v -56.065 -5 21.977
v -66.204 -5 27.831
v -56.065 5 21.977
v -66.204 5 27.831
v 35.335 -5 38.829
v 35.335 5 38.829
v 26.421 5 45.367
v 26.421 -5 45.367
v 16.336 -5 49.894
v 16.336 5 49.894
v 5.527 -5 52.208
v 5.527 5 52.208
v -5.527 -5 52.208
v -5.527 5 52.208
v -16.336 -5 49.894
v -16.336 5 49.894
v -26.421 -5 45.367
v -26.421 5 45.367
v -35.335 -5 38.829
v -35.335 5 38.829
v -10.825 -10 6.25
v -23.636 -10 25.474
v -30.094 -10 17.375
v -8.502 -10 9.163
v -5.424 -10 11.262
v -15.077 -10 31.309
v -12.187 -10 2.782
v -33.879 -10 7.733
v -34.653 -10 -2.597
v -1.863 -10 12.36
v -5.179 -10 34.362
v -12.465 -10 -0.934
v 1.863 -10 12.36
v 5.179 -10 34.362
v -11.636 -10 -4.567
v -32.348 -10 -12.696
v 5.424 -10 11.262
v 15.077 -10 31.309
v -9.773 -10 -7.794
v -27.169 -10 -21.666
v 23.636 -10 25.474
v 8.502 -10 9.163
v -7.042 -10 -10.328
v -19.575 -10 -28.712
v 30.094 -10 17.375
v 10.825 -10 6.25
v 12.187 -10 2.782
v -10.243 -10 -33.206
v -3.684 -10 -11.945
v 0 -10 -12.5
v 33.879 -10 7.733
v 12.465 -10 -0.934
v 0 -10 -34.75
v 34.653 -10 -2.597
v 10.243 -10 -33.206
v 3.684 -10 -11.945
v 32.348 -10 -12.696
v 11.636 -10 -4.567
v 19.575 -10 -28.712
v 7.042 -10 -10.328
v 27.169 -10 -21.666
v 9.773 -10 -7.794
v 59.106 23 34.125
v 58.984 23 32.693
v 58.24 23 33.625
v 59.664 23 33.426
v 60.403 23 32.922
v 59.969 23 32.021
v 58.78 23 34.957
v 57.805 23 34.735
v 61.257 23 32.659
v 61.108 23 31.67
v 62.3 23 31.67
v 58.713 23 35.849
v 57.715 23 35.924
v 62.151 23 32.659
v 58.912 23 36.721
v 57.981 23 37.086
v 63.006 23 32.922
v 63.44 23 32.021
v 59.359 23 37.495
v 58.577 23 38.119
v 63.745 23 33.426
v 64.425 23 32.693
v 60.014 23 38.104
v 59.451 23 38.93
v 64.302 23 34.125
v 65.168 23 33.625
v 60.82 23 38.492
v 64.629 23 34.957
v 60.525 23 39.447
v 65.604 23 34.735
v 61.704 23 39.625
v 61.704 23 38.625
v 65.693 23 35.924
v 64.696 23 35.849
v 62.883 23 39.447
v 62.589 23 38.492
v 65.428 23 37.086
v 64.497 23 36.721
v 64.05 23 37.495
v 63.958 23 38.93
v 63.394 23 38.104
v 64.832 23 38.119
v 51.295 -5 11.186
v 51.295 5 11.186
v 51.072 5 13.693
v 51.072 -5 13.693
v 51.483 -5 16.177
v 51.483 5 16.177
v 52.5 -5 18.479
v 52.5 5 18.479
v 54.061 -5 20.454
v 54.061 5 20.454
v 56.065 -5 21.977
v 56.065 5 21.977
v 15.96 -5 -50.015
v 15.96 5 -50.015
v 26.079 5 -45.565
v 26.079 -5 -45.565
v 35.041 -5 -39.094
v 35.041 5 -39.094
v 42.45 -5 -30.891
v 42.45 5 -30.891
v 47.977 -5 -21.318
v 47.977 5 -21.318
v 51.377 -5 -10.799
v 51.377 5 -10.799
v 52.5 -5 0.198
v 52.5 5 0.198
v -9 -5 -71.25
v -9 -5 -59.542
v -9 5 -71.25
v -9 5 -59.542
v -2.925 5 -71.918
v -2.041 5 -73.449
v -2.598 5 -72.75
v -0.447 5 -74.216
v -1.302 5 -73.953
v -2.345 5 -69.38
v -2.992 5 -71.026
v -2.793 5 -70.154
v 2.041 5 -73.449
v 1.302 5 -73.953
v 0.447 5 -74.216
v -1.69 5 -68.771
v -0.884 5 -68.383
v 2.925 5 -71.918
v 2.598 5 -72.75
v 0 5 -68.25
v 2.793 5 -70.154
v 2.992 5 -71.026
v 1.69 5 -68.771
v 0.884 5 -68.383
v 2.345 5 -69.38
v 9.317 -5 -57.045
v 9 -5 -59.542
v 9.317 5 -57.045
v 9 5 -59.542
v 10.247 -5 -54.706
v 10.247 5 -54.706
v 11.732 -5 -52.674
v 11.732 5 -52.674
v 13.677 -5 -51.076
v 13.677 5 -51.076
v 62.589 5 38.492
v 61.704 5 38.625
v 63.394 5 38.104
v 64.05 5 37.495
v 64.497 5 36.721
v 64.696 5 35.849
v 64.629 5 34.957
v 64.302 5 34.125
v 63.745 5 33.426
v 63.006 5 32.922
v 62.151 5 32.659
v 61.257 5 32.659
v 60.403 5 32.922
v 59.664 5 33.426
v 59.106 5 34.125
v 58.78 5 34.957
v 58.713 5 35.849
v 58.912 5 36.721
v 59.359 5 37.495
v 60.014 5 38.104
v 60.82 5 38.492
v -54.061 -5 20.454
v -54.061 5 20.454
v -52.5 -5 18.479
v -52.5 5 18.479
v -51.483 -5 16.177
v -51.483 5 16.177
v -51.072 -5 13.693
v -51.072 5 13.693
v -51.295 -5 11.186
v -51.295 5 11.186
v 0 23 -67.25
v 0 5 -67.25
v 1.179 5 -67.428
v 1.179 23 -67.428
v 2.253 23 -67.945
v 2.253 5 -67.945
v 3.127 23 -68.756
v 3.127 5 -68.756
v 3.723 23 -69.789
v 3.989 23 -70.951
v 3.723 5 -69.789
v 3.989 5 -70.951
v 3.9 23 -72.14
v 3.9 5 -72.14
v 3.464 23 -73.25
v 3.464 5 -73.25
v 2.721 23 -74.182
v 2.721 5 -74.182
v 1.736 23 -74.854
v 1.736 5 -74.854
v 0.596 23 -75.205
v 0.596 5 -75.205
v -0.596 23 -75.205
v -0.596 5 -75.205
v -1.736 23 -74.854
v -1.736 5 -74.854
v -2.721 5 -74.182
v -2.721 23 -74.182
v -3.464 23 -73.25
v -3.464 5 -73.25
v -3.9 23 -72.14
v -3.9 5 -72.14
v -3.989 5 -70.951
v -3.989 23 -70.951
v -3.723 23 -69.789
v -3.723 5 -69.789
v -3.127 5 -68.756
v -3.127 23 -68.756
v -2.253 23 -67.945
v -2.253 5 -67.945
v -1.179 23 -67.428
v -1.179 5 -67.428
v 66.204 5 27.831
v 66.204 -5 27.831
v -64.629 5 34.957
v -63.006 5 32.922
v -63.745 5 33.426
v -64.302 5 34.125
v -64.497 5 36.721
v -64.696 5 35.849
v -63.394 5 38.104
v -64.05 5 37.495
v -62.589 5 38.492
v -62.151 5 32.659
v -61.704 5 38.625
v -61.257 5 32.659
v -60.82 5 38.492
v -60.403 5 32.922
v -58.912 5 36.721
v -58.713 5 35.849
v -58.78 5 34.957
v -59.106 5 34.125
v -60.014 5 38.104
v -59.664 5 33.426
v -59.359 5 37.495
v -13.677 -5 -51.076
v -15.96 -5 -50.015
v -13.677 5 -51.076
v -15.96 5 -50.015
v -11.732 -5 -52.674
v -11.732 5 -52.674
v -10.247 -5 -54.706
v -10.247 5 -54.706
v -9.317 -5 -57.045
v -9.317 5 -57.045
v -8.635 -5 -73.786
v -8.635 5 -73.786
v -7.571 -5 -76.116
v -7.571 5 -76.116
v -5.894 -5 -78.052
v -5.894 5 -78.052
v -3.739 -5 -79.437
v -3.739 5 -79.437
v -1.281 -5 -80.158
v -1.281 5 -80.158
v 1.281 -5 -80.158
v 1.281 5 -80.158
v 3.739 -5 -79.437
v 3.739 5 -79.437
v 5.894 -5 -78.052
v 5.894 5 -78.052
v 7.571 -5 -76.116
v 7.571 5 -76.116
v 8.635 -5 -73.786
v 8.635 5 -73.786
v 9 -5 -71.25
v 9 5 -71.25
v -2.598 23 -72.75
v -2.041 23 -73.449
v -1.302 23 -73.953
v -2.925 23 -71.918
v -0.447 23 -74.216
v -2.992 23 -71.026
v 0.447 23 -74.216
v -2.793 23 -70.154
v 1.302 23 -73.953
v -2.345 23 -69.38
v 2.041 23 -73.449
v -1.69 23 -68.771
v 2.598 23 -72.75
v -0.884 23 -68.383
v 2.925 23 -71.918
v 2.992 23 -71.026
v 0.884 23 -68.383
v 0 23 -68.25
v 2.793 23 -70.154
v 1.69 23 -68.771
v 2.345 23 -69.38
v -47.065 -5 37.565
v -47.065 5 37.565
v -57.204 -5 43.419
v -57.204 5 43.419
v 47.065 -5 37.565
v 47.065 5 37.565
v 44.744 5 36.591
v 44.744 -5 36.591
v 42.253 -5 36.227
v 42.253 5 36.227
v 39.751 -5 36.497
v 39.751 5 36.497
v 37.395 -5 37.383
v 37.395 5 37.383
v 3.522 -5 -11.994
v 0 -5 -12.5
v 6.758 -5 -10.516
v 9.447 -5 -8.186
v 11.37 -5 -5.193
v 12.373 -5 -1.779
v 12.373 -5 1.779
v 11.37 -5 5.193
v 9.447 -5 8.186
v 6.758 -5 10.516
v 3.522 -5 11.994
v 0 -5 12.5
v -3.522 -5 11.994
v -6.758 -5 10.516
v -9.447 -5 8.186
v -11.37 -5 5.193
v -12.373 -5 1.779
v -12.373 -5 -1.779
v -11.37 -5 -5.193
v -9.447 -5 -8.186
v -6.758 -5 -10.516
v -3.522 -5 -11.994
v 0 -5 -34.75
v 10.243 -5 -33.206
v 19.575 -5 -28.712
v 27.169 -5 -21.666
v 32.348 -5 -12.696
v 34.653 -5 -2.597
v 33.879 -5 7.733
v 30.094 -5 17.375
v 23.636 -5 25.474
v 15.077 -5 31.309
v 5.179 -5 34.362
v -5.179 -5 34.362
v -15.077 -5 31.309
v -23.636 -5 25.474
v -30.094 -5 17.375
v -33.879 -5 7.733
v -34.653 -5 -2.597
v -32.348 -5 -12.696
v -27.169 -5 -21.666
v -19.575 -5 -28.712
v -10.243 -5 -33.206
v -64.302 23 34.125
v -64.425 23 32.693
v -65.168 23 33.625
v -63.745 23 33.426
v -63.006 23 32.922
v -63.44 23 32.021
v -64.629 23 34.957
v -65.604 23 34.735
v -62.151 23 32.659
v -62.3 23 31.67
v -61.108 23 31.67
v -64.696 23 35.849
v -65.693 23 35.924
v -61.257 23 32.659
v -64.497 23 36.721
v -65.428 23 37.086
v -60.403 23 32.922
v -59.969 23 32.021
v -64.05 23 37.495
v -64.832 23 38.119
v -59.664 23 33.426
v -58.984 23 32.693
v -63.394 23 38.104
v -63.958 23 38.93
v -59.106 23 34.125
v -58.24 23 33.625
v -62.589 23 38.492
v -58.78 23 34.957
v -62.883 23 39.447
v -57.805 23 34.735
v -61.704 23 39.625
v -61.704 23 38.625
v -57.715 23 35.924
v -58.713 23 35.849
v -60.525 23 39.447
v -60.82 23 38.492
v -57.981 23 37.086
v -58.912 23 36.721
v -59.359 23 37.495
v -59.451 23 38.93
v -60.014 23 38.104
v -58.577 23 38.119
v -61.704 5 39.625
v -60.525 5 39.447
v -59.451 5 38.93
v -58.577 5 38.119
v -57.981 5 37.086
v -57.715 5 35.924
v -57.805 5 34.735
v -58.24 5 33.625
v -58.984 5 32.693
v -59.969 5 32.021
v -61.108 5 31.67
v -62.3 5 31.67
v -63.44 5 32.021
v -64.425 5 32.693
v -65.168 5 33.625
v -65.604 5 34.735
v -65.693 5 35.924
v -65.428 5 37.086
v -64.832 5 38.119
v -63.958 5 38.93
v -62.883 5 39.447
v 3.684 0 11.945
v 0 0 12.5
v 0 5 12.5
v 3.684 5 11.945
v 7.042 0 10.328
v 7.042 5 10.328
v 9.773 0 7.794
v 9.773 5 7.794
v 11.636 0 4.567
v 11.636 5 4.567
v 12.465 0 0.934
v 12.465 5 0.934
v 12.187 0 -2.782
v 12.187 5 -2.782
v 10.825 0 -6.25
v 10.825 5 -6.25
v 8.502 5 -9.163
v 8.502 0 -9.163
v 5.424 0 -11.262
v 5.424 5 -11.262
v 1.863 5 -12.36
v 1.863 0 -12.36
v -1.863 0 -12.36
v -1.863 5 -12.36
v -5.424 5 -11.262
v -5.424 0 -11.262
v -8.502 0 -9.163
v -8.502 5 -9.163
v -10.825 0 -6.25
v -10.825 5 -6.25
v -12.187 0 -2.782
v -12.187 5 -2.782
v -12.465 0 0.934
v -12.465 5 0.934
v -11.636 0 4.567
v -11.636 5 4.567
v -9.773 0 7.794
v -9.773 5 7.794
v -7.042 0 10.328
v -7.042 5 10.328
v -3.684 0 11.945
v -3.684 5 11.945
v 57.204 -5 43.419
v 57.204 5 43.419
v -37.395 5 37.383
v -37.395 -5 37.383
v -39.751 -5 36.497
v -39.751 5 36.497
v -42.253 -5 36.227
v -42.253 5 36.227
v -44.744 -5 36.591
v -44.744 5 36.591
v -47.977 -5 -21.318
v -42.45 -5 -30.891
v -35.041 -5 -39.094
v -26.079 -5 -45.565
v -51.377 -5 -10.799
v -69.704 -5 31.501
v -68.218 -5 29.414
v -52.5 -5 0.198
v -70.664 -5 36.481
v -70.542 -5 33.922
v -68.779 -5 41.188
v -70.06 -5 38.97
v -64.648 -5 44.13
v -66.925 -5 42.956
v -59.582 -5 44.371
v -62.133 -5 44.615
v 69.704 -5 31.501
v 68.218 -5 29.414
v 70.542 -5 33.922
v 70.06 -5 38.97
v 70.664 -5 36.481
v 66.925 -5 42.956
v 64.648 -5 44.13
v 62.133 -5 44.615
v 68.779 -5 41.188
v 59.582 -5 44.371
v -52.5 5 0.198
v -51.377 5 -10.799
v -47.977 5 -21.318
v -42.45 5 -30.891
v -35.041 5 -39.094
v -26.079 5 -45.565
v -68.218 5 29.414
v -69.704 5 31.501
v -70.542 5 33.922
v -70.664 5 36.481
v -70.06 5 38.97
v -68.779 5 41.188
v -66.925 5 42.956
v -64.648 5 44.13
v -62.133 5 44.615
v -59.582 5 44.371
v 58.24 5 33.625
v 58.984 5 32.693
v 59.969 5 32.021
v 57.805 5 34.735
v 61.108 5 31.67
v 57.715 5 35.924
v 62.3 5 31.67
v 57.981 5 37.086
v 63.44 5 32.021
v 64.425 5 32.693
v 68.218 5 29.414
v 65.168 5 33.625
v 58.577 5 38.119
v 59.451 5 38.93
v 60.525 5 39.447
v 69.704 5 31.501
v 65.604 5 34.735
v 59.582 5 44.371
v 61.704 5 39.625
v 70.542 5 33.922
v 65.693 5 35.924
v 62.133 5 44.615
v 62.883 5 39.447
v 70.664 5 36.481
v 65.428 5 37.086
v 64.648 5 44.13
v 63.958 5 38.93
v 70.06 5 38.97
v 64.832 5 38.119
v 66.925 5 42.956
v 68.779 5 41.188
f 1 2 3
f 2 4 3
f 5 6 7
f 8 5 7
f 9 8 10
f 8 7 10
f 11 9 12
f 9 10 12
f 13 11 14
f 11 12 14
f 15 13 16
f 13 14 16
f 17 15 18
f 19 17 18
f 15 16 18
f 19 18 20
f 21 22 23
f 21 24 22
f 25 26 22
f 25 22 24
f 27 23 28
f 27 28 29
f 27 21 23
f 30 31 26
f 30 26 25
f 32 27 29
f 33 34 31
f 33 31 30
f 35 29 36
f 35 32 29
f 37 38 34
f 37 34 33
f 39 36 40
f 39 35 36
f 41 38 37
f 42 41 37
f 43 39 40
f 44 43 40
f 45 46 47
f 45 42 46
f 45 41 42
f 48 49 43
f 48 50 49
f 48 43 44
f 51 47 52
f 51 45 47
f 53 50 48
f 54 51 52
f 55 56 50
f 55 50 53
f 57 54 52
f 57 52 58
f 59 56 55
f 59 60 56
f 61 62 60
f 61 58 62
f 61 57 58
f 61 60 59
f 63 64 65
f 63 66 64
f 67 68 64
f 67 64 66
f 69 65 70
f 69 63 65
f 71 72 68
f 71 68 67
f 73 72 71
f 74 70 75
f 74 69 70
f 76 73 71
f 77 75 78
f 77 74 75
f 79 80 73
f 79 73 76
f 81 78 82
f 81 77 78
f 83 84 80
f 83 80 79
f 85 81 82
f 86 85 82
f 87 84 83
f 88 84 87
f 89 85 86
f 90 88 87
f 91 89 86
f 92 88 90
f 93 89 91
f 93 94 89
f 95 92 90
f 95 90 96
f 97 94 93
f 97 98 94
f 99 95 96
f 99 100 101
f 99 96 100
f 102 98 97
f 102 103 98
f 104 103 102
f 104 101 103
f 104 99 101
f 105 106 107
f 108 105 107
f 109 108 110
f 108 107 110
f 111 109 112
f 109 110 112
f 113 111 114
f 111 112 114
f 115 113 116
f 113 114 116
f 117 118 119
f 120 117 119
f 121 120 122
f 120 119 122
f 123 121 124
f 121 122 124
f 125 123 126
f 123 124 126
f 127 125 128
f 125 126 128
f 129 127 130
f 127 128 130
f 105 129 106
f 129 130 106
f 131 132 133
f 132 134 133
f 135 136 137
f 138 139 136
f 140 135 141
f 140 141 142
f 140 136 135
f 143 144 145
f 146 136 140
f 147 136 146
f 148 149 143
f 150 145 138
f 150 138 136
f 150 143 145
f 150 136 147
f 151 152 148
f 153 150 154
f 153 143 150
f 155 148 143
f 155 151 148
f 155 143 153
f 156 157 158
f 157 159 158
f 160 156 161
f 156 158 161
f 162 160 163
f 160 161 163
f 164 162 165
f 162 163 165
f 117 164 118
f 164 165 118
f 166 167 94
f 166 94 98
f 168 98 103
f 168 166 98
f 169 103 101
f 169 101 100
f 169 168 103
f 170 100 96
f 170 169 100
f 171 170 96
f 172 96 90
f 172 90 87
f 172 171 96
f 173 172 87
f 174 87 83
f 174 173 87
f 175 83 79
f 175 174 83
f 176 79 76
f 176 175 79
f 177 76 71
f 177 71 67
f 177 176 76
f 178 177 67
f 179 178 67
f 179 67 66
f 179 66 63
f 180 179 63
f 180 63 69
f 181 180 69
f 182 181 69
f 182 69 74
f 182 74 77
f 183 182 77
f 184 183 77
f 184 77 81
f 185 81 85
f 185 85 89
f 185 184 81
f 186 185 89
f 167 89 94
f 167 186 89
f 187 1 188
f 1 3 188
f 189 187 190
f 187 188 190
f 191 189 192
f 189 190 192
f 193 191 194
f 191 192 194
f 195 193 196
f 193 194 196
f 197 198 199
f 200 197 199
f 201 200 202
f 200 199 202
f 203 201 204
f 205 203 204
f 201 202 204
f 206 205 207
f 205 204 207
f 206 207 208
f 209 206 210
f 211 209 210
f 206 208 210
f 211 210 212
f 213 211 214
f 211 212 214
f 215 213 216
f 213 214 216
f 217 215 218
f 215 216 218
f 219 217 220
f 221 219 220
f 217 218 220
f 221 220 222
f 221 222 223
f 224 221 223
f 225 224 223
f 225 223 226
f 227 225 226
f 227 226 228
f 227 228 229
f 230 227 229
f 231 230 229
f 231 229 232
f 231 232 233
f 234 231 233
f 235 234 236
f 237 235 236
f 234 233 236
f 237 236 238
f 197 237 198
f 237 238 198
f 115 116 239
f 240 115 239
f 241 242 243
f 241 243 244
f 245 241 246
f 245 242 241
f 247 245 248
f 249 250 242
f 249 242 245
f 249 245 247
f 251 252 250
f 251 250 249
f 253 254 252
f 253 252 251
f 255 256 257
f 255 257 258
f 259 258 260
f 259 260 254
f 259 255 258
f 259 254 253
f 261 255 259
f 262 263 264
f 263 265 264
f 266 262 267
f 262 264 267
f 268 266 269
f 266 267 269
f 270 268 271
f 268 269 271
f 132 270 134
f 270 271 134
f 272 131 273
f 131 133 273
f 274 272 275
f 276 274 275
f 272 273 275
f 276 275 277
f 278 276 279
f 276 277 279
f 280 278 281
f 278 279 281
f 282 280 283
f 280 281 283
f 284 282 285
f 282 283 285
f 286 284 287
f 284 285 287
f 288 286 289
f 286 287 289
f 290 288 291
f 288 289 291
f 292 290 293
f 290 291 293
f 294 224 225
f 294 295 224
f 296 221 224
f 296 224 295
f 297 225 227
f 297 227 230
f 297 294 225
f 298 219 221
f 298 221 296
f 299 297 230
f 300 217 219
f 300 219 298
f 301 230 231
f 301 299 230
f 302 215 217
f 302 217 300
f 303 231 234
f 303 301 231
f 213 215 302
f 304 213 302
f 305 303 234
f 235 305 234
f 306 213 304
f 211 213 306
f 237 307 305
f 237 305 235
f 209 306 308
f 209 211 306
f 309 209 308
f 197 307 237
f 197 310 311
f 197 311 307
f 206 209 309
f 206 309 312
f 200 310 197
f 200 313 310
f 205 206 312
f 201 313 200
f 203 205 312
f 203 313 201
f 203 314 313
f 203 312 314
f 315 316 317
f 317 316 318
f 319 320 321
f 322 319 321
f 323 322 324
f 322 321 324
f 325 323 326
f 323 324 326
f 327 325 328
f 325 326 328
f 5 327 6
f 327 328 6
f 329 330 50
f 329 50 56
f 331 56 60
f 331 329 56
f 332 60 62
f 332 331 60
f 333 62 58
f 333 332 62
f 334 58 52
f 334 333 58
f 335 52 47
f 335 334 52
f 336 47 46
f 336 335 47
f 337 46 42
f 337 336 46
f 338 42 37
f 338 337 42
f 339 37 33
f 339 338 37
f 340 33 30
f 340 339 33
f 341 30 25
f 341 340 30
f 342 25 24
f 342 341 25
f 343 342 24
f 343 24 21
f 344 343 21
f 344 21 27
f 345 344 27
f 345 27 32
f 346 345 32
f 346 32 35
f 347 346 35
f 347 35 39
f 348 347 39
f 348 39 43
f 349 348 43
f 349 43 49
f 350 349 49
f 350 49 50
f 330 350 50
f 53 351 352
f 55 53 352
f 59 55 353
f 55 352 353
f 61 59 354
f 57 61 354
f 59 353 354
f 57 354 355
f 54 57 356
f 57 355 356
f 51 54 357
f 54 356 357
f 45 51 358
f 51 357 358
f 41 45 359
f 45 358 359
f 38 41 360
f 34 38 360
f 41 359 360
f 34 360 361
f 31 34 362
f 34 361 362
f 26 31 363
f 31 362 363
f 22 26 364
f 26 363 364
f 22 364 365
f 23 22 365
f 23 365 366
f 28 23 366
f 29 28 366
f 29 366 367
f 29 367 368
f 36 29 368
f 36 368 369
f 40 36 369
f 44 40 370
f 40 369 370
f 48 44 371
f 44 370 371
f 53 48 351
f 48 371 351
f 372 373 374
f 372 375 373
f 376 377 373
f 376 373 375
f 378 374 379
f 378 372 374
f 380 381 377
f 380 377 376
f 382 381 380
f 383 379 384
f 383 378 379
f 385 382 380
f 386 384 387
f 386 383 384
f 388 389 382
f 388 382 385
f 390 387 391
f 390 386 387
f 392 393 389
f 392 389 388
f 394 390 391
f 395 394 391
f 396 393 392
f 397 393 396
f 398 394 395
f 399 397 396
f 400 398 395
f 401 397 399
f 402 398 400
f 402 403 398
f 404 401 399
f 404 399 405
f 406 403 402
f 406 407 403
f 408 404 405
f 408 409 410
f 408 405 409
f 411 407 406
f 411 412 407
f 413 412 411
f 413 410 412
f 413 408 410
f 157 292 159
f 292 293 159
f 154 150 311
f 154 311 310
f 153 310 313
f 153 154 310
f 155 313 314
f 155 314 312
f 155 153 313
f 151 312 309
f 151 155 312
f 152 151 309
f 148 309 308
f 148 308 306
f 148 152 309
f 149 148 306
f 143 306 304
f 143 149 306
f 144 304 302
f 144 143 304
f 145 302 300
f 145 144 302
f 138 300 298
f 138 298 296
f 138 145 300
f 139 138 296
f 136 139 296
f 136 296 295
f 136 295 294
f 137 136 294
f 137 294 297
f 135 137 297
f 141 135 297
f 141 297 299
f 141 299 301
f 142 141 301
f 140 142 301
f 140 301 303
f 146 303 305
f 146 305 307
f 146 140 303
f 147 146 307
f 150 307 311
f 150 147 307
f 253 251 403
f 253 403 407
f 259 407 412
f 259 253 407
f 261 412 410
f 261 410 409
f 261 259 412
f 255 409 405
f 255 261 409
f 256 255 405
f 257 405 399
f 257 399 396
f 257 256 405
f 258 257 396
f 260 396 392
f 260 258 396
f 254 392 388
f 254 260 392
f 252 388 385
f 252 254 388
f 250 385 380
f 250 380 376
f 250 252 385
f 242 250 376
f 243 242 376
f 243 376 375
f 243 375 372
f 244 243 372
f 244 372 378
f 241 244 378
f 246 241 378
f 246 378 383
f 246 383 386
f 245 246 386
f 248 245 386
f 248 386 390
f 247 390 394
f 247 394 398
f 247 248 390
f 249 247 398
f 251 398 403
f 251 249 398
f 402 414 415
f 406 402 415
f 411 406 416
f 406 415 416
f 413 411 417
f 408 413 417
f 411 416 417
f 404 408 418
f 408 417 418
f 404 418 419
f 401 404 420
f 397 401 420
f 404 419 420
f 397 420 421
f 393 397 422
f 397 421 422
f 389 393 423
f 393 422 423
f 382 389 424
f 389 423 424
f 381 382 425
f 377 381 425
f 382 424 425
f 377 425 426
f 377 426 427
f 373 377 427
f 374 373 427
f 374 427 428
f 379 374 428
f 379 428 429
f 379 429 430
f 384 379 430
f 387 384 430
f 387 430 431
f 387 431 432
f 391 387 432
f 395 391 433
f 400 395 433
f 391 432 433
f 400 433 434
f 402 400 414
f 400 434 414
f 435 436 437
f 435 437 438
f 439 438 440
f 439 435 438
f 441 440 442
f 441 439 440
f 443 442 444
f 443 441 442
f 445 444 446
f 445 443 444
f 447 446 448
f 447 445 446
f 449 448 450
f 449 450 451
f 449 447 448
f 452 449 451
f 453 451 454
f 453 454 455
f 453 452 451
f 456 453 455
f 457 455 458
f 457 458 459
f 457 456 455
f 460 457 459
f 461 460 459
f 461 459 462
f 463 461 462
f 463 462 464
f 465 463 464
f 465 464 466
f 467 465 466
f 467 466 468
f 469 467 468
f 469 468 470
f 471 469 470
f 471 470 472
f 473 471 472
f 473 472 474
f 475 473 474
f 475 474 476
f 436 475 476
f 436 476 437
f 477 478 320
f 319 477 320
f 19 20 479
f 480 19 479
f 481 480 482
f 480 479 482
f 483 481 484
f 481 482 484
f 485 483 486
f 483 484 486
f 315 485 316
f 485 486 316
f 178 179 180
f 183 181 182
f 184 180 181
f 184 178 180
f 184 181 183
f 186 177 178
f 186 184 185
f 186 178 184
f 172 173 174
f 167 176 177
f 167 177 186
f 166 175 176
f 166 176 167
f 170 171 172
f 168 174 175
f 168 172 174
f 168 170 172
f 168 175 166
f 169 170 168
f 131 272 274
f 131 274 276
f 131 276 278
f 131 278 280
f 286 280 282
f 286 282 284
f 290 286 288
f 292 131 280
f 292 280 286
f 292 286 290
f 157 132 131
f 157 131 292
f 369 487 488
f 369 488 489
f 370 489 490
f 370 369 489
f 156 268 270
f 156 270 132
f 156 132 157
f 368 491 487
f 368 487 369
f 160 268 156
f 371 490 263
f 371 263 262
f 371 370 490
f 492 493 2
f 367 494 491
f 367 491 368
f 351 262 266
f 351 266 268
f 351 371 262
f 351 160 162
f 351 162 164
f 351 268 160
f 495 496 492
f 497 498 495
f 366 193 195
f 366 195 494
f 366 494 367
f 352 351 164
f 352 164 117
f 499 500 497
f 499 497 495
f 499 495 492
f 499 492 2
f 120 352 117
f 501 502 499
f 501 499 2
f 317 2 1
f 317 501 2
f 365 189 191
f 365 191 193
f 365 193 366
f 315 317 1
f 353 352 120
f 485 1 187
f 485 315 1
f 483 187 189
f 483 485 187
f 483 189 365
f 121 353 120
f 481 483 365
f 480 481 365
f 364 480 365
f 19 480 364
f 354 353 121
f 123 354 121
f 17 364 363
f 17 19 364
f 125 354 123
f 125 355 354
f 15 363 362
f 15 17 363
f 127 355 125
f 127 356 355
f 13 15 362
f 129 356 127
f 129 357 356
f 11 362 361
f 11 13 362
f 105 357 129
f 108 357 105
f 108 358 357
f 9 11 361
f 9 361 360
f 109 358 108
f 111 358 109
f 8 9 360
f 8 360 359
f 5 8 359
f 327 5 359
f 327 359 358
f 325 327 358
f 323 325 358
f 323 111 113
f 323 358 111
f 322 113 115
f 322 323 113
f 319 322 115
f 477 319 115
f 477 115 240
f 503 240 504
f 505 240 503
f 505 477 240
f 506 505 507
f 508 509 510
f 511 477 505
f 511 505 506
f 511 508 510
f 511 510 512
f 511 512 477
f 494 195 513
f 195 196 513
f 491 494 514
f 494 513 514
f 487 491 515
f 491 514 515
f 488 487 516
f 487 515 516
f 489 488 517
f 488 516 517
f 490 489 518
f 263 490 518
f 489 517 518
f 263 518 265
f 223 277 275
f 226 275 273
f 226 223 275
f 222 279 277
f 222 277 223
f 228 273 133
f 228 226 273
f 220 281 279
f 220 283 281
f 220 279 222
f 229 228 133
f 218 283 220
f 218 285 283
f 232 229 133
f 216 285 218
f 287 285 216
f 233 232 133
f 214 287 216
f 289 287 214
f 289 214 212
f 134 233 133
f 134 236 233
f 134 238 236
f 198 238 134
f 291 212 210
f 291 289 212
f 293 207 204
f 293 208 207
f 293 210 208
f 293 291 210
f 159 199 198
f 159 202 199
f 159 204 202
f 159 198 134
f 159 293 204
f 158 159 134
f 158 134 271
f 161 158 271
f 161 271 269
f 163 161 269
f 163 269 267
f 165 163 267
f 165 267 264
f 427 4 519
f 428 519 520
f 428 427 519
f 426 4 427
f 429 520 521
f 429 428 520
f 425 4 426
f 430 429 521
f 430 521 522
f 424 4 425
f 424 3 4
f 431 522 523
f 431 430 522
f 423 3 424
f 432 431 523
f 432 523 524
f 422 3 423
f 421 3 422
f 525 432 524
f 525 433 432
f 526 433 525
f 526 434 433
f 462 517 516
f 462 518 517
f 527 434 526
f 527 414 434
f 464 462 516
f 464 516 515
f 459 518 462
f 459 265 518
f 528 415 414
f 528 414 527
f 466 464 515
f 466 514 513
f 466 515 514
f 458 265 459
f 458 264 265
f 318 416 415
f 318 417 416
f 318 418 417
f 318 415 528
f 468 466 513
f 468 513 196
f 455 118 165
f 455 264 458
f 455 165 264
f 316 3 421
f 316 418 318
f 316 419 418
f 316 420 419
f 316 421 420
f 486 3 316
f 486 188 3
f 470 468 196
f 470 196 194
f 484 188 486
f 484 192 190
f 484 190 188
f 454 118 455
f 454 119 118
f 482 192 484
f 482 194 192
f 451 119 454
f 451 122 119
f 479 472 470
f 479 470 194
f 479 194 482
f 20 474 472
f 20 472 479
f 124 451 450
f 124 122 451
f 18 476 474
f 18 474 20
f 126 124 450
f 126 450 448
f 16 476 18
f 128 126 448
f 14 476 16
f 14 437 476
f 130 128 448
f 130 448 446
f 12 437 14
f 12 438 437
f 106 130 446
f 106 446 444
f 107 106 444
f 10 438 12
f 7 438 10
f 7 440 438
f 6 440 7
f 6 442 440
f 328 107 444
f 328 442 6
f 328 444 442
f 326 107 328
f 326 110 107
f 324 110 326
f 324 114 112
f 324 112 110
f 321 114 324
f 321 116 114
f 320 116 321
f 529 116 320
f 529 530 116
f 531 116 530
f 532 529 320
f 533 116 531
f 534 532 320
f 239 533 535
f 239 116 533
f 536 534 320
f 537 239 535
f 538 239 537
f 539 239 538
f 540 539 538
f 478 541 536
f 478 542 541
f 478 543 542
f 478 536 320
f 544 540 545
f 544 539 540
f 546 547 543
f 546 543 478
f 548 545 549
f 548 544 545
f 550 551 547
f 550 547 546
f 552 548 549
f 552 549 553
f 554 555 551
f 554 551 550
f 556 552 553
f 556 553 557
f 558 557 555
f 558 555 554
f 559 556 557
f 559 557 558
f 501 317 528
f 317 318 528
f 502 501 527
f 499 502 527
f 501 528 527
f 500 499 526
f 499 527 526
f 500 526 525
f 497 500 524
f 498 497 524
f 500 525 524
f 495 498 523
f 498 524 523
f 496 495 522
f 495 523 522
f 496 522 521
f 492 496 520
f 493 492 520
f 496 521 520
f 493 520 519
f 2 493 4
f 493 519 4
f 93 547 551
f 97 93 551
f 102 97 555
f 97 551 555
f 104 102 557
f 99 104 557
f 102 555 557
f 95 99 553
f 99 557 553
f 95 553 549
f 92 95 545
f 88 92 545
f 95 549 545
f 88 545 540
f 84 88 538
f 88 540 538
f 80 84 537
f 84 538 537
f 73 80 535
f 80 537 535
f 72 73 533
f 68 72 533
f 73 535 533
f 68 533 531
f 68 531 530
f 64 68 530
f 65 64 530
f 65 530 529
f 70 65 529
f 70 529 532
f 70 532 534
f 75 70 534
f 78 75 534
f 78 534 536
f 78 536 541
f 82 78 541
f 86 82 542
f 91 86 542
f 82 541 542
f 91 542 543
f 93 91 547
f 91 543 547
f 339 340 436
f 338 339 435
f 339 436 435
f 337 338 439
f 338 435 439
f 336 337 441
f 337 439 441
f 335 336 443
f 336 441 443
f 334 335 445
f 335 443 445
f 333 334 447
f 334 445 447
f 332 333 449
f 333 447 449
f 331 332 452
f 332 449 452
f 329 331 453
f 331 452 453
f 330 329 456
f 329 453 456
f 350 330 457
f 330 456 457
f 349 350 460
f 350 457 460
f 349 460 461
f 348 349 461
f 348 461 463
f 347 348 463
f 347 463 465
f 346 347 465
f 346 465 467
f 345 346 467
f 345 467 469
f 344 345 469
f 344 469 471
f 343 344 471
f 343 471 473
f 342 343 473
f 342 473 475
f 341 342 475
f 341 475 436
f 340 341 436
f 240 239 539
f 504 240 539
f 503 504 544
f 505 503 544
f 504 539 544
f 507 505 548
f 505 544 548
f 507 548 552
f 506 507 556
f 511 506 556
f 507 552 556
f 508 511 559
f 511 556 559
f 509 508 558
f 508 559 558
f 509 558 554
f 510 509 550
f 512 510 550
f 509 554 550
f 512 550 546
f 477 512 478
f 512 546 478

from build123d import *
from build123d.topology import SkipClean

# Parameters (mm, degrees)
SKETCH_1_R               = 82.5
SKETCH_1_R_2             = 12.5
EXTRUDE_1_DEPTH          = 5
SKETCH_2_R               = 4
SKETCH_2_R_2             = 3
EXTRUDE_2_DEPTH          = 18
EXTRUDE_START            = 5
SKETCH_3_R               = 35
SKETCH_3_R_2             = 12.5
EXTRUDE_3_DEPTH          = 5
CUT_EXTRUDE_1_DEPTH      = 119.05295422
CUT_EXTRUDE_1_DEPTH_BACK = 10
SKETCH_4_R               = 82.5
EXTRUDE_4_DEPTH          = 5
SKETCH_6_R               = 12.5
CUT_EXTRUDE_2_DEPTH      = 110.399094856
SKETCH_7_R               = 34.75
SKETCH_7_R_2             = 12.5
EXTRUDE_5_DEPTH          = 5


with BuildPart() as part:
    # 草圖1 → 填料-伸長1 (new body)
    with BuildSketch(Plane(origin=(0, 0, 0), x_dir=(1, 0, 0), z_dir=(0, 1, 0))):
        with Locations(Location((0, 0, 0), (0, 0, 270))):
            Circle(SKETCH_1_R)
        with Locations(Location((0, 0, 0), (0, 0, 270))):
            Circle(SKETCH_1_R_2, mode=Mode.SUBTRACT)
    extrude(amount=EXTRUDE_1_DEPTH)

    # 草圖2 → 填料-伸長2 (add)
    # profile 1 of 3: a face of its own
    with BuildSketch(Plane(origin=(0, 5, 0), x_dir=(1, 0, 0), z_dir=(0, 1, 0))):
        with Locations(Location((0, 71.25, 0), (0, 0, 270))):
            Circle(SKETCH_2_R)
        with Locations(Location((0, 71.25, 0), (0, 0, 270))):
            Circle(SKETCH_2_R_2, mode=Mode.SUBTRACT)
    # profile 2 of 3: a face of its own
    with BuildSketch(Plane(origin=(0, 5, 0), x_dir=(1, 0, 0), z_dir=(0, 1, 0))):
        with Locations(Location((61.70431002, -35.625, 0), (0, 0, 270))):
            Circle(SKETCH_2_R)
        with Locations(Location((61.70431002, -35.625, 0), (0, 0, 270))):
            Circle(SKETCH_2_R_2, mode=Mode.SUBTRACT)
    # profile 3 of 3: a face of its own
    with BuildSketch(Plane(origin=(0, 5, 0), x_dir=(1, 0, 0), z_dir=(0, 1, 0))):
        with Locations(Location((-61.70431002, -35.625, 0), (0, 0, 270))):
            Circle(SKETCH_2_R)
        with Locations(Location((-61.70431002, -35.625, 0), (0, 0, 270))):
            Circle(SKETCH_2_R_2, mode=Mode.SUBTRACT)
    extrude(amount=EXTRUDE_2_DEPTH)

    # 草圖3 → 填料-伸長3 (add)
    with SkipClean():  # the faces are left unmerged after this step: merging them gives an invalid solid
        with BuildSketch(Plane.XZ.offset(EXTRUDE_START)):
            with Locations(Location((0, 0, 0), (0, 0, 90))):
                Circle(SKETCH_3_R)
            with Locations(Location((0, 0, 0), (0, 0, 270))):
                Circle(SKETCH_3_R_2, mode=Mode.SUBTRACT)
        extrude(amount=-EXTRUDE_3_DEPTH)

    # 草圖4 → 除料-伸長1 (cut, two sides: drawn at the far end of the back side and taken through both)
    with SkipClean():  # the faces are left unmerged after this step: merging them gives an invalid solid
        with BuildSketch(Plane(origin=(0, 5, 0), x_dir=(1, 0, 0), z_dir=(0, 1, 0)).offset(-CUT_EXTRUDE_1_DEPTH_BACK)):
            Circle(SKETCH_4_R)
            with BuildLine():
                ThreePointArc((-35.334504499, -38.829406277), (0, -52.5), (35.334504499, -38.829406277))
                ThreePointArc((35.334504499, -38.829406277), (40.993396246, -36.283053927), (47.064886308, -37.565229625))
                Line((47.064886308, -37.565229625), (57.20431002, -43.419228634))
                ThreePointArc((57.20431002, -43.419228634), (69.498538654, -40.125), (66.20431002, -27.830771366))
                Line((66.20431002, -27.830771366), (56.064886308, -21.976772357))
                ThreePointArc((56.064886308, -21.976772357), (51.918744551, -17.359795573), (51.294504499, -11.185875388))
                ThreePointArc((51.294504499, -11.185875388), (45.466333699, 26.25), (15.96, 50.015281665))
                ThreePointArc((15.96, 50.015281665), (10.925348305, 53.6428495), (9, 59.542001982))
                Line((9, 59.542001982), (9, 71.25))
                ThreePointArc((9, 71.25), (0, 80.25), (-9, 71.25))
                Line((-9, 71.25), (-9, 59.542001982))
                ThreePointArc((-9, 59.542001982), (-10.925348305, 53.6428495), (-15.96, 50.015281665))
                ThreePointArc((-15.96, 50.015281665), (-45.466333699, 26.25), (-51.294504499, -11.185875388))
                ThreePointArc((-51.294504499, -11.185875388), (-51.918744551, -17.359795573), (-56.064886308, -21.976772357))
                Line((-56.064886308, -21.976772357), (-66.20431002, -27.830771366))
                ThreePointArc((-66.20431002, -27.830771366), (-69.498538654, -40.125), (-57.20431002, -43.419228634))
                Line((-57.20431002, -43.419228634), (-47.064886308, -37.565229625))
                ThreePointArc((-47.064886308, -37.565229625), (-40.993396246, -36.283053927), (-35.334504499, -38.829406277))
            make_face(mode=Mode.SUBTRACT)
        extrude(amount=CUT_EXTRUDE_1_DEPTH + CUT_EXTRUDE_1_DEPTH_BACK, mode=Mode.SUBTRACT)

    # 草圖5 → 填料-伸長4 (add)
    with BuildSketch(Plane.XZ):
        with BuildLine():
            Line((-47.064886308, 37.565229625), (-57.20431002, 43.419228634))
            ThreePointArc((-57.20431002, 43.419228634), (-69.498538654, 40.125), (-66.20431002, 27.830771366))
            Line((-66.20431002, 27.830771366), (-56.064886308, 21.976772357))
            ThreePointArc((-56.064886308, 21.976772357), (-51.918744551, 17.359795573), (-51.294504499, 11.185875388))
            ThreePointArc((-51.294504499, 11.185875388), (-45.466333699, -26.25), (-15.96, -50.015281665))
            ThreePointArc((-15.96, -50.015281665), (-10.925348305, -53.6428495), (-9, -59.542001982))
            Line((-9, -59.542001982), (-9, -71.25))
            ThreePointArc((-9, -71.25), (0, -80.25), (9, -71.25))
            Line((9, -71.25), (9, -59.542001982))
            ThreePointArc((9, -59.542001982), (10.925348305, -53.6428495), (15.96, -50.015281665))
            ThreePointArc((15.96, -50.015281665), (45.466333699, -26.25), (51.294504499, 11.185875388))
            ThreePointArc((51.294504499, 11.185875388), (51.918744551, 17.359795573), (56.064886308, 21.976772357))
            Line((56.064886308, 21.976772357), (66.20431002, 27.830771366))
            ThreePointArc((66.20431002, 27.830771366), (69.498538654, 40.125), (57.20431002, 43.419228634))
            Line((57.20431002, 43.419228634), (47.064886308, 37.565229625))
            ThreePointArc((47.064886308, 37.565229625), (40.993396246, 36.283053927), (35.334504499, 38.829406277))
            ThreePointArc((35.334504499, 38.829406277), (0, 52.5), (-35.334504499, 38.829406277))
            ThreePointArc((-35.334504499, 38.829406277), (-40.993396246, 36.283053927), (-47.064886308, 37.565229625))
        make_face()
    extrude(amount=EXTRUDE_4_DEPTH)

    # 草圖6 → 除料-伸長2 (cut, through all)
    with BuildSketch(Plane(origin=(0, 0, 0), x_dir=(1, 0, 0), z_dir=(0, 1, 0))):
        with Locations(Location((0, 0, 0), (0, 0, 270))):
            Circle(SKETCH_6_R)
    extrude(amount=-CUT_EXTRUDE_2_DEPTH, mode=Mode.SUBTRACT)

    # 草圖7 → 填料-伸長5 (add)
    with SkipClean():  # the faces are left unmerged after this step: merging them gives an invalid solid
        with BuildSketch(Plane.XZ.offset(5)):
            with Locations(Location((0, 0, 0), (0, 0, 270))):
                Circle(SKETCH_7_R)
            with Locations(Location((0, 0, 0), (0, 0, 270))):
                Circle(SKETCH_7_R_2, mode=Mode.SUBTRACT)
        extrude(amount=EXTRUDE_5_DEPTH)
    add(part.part.scale(1), mode=Mode.REPLACE)  # the faces are merged on a copy


solid = part.part
